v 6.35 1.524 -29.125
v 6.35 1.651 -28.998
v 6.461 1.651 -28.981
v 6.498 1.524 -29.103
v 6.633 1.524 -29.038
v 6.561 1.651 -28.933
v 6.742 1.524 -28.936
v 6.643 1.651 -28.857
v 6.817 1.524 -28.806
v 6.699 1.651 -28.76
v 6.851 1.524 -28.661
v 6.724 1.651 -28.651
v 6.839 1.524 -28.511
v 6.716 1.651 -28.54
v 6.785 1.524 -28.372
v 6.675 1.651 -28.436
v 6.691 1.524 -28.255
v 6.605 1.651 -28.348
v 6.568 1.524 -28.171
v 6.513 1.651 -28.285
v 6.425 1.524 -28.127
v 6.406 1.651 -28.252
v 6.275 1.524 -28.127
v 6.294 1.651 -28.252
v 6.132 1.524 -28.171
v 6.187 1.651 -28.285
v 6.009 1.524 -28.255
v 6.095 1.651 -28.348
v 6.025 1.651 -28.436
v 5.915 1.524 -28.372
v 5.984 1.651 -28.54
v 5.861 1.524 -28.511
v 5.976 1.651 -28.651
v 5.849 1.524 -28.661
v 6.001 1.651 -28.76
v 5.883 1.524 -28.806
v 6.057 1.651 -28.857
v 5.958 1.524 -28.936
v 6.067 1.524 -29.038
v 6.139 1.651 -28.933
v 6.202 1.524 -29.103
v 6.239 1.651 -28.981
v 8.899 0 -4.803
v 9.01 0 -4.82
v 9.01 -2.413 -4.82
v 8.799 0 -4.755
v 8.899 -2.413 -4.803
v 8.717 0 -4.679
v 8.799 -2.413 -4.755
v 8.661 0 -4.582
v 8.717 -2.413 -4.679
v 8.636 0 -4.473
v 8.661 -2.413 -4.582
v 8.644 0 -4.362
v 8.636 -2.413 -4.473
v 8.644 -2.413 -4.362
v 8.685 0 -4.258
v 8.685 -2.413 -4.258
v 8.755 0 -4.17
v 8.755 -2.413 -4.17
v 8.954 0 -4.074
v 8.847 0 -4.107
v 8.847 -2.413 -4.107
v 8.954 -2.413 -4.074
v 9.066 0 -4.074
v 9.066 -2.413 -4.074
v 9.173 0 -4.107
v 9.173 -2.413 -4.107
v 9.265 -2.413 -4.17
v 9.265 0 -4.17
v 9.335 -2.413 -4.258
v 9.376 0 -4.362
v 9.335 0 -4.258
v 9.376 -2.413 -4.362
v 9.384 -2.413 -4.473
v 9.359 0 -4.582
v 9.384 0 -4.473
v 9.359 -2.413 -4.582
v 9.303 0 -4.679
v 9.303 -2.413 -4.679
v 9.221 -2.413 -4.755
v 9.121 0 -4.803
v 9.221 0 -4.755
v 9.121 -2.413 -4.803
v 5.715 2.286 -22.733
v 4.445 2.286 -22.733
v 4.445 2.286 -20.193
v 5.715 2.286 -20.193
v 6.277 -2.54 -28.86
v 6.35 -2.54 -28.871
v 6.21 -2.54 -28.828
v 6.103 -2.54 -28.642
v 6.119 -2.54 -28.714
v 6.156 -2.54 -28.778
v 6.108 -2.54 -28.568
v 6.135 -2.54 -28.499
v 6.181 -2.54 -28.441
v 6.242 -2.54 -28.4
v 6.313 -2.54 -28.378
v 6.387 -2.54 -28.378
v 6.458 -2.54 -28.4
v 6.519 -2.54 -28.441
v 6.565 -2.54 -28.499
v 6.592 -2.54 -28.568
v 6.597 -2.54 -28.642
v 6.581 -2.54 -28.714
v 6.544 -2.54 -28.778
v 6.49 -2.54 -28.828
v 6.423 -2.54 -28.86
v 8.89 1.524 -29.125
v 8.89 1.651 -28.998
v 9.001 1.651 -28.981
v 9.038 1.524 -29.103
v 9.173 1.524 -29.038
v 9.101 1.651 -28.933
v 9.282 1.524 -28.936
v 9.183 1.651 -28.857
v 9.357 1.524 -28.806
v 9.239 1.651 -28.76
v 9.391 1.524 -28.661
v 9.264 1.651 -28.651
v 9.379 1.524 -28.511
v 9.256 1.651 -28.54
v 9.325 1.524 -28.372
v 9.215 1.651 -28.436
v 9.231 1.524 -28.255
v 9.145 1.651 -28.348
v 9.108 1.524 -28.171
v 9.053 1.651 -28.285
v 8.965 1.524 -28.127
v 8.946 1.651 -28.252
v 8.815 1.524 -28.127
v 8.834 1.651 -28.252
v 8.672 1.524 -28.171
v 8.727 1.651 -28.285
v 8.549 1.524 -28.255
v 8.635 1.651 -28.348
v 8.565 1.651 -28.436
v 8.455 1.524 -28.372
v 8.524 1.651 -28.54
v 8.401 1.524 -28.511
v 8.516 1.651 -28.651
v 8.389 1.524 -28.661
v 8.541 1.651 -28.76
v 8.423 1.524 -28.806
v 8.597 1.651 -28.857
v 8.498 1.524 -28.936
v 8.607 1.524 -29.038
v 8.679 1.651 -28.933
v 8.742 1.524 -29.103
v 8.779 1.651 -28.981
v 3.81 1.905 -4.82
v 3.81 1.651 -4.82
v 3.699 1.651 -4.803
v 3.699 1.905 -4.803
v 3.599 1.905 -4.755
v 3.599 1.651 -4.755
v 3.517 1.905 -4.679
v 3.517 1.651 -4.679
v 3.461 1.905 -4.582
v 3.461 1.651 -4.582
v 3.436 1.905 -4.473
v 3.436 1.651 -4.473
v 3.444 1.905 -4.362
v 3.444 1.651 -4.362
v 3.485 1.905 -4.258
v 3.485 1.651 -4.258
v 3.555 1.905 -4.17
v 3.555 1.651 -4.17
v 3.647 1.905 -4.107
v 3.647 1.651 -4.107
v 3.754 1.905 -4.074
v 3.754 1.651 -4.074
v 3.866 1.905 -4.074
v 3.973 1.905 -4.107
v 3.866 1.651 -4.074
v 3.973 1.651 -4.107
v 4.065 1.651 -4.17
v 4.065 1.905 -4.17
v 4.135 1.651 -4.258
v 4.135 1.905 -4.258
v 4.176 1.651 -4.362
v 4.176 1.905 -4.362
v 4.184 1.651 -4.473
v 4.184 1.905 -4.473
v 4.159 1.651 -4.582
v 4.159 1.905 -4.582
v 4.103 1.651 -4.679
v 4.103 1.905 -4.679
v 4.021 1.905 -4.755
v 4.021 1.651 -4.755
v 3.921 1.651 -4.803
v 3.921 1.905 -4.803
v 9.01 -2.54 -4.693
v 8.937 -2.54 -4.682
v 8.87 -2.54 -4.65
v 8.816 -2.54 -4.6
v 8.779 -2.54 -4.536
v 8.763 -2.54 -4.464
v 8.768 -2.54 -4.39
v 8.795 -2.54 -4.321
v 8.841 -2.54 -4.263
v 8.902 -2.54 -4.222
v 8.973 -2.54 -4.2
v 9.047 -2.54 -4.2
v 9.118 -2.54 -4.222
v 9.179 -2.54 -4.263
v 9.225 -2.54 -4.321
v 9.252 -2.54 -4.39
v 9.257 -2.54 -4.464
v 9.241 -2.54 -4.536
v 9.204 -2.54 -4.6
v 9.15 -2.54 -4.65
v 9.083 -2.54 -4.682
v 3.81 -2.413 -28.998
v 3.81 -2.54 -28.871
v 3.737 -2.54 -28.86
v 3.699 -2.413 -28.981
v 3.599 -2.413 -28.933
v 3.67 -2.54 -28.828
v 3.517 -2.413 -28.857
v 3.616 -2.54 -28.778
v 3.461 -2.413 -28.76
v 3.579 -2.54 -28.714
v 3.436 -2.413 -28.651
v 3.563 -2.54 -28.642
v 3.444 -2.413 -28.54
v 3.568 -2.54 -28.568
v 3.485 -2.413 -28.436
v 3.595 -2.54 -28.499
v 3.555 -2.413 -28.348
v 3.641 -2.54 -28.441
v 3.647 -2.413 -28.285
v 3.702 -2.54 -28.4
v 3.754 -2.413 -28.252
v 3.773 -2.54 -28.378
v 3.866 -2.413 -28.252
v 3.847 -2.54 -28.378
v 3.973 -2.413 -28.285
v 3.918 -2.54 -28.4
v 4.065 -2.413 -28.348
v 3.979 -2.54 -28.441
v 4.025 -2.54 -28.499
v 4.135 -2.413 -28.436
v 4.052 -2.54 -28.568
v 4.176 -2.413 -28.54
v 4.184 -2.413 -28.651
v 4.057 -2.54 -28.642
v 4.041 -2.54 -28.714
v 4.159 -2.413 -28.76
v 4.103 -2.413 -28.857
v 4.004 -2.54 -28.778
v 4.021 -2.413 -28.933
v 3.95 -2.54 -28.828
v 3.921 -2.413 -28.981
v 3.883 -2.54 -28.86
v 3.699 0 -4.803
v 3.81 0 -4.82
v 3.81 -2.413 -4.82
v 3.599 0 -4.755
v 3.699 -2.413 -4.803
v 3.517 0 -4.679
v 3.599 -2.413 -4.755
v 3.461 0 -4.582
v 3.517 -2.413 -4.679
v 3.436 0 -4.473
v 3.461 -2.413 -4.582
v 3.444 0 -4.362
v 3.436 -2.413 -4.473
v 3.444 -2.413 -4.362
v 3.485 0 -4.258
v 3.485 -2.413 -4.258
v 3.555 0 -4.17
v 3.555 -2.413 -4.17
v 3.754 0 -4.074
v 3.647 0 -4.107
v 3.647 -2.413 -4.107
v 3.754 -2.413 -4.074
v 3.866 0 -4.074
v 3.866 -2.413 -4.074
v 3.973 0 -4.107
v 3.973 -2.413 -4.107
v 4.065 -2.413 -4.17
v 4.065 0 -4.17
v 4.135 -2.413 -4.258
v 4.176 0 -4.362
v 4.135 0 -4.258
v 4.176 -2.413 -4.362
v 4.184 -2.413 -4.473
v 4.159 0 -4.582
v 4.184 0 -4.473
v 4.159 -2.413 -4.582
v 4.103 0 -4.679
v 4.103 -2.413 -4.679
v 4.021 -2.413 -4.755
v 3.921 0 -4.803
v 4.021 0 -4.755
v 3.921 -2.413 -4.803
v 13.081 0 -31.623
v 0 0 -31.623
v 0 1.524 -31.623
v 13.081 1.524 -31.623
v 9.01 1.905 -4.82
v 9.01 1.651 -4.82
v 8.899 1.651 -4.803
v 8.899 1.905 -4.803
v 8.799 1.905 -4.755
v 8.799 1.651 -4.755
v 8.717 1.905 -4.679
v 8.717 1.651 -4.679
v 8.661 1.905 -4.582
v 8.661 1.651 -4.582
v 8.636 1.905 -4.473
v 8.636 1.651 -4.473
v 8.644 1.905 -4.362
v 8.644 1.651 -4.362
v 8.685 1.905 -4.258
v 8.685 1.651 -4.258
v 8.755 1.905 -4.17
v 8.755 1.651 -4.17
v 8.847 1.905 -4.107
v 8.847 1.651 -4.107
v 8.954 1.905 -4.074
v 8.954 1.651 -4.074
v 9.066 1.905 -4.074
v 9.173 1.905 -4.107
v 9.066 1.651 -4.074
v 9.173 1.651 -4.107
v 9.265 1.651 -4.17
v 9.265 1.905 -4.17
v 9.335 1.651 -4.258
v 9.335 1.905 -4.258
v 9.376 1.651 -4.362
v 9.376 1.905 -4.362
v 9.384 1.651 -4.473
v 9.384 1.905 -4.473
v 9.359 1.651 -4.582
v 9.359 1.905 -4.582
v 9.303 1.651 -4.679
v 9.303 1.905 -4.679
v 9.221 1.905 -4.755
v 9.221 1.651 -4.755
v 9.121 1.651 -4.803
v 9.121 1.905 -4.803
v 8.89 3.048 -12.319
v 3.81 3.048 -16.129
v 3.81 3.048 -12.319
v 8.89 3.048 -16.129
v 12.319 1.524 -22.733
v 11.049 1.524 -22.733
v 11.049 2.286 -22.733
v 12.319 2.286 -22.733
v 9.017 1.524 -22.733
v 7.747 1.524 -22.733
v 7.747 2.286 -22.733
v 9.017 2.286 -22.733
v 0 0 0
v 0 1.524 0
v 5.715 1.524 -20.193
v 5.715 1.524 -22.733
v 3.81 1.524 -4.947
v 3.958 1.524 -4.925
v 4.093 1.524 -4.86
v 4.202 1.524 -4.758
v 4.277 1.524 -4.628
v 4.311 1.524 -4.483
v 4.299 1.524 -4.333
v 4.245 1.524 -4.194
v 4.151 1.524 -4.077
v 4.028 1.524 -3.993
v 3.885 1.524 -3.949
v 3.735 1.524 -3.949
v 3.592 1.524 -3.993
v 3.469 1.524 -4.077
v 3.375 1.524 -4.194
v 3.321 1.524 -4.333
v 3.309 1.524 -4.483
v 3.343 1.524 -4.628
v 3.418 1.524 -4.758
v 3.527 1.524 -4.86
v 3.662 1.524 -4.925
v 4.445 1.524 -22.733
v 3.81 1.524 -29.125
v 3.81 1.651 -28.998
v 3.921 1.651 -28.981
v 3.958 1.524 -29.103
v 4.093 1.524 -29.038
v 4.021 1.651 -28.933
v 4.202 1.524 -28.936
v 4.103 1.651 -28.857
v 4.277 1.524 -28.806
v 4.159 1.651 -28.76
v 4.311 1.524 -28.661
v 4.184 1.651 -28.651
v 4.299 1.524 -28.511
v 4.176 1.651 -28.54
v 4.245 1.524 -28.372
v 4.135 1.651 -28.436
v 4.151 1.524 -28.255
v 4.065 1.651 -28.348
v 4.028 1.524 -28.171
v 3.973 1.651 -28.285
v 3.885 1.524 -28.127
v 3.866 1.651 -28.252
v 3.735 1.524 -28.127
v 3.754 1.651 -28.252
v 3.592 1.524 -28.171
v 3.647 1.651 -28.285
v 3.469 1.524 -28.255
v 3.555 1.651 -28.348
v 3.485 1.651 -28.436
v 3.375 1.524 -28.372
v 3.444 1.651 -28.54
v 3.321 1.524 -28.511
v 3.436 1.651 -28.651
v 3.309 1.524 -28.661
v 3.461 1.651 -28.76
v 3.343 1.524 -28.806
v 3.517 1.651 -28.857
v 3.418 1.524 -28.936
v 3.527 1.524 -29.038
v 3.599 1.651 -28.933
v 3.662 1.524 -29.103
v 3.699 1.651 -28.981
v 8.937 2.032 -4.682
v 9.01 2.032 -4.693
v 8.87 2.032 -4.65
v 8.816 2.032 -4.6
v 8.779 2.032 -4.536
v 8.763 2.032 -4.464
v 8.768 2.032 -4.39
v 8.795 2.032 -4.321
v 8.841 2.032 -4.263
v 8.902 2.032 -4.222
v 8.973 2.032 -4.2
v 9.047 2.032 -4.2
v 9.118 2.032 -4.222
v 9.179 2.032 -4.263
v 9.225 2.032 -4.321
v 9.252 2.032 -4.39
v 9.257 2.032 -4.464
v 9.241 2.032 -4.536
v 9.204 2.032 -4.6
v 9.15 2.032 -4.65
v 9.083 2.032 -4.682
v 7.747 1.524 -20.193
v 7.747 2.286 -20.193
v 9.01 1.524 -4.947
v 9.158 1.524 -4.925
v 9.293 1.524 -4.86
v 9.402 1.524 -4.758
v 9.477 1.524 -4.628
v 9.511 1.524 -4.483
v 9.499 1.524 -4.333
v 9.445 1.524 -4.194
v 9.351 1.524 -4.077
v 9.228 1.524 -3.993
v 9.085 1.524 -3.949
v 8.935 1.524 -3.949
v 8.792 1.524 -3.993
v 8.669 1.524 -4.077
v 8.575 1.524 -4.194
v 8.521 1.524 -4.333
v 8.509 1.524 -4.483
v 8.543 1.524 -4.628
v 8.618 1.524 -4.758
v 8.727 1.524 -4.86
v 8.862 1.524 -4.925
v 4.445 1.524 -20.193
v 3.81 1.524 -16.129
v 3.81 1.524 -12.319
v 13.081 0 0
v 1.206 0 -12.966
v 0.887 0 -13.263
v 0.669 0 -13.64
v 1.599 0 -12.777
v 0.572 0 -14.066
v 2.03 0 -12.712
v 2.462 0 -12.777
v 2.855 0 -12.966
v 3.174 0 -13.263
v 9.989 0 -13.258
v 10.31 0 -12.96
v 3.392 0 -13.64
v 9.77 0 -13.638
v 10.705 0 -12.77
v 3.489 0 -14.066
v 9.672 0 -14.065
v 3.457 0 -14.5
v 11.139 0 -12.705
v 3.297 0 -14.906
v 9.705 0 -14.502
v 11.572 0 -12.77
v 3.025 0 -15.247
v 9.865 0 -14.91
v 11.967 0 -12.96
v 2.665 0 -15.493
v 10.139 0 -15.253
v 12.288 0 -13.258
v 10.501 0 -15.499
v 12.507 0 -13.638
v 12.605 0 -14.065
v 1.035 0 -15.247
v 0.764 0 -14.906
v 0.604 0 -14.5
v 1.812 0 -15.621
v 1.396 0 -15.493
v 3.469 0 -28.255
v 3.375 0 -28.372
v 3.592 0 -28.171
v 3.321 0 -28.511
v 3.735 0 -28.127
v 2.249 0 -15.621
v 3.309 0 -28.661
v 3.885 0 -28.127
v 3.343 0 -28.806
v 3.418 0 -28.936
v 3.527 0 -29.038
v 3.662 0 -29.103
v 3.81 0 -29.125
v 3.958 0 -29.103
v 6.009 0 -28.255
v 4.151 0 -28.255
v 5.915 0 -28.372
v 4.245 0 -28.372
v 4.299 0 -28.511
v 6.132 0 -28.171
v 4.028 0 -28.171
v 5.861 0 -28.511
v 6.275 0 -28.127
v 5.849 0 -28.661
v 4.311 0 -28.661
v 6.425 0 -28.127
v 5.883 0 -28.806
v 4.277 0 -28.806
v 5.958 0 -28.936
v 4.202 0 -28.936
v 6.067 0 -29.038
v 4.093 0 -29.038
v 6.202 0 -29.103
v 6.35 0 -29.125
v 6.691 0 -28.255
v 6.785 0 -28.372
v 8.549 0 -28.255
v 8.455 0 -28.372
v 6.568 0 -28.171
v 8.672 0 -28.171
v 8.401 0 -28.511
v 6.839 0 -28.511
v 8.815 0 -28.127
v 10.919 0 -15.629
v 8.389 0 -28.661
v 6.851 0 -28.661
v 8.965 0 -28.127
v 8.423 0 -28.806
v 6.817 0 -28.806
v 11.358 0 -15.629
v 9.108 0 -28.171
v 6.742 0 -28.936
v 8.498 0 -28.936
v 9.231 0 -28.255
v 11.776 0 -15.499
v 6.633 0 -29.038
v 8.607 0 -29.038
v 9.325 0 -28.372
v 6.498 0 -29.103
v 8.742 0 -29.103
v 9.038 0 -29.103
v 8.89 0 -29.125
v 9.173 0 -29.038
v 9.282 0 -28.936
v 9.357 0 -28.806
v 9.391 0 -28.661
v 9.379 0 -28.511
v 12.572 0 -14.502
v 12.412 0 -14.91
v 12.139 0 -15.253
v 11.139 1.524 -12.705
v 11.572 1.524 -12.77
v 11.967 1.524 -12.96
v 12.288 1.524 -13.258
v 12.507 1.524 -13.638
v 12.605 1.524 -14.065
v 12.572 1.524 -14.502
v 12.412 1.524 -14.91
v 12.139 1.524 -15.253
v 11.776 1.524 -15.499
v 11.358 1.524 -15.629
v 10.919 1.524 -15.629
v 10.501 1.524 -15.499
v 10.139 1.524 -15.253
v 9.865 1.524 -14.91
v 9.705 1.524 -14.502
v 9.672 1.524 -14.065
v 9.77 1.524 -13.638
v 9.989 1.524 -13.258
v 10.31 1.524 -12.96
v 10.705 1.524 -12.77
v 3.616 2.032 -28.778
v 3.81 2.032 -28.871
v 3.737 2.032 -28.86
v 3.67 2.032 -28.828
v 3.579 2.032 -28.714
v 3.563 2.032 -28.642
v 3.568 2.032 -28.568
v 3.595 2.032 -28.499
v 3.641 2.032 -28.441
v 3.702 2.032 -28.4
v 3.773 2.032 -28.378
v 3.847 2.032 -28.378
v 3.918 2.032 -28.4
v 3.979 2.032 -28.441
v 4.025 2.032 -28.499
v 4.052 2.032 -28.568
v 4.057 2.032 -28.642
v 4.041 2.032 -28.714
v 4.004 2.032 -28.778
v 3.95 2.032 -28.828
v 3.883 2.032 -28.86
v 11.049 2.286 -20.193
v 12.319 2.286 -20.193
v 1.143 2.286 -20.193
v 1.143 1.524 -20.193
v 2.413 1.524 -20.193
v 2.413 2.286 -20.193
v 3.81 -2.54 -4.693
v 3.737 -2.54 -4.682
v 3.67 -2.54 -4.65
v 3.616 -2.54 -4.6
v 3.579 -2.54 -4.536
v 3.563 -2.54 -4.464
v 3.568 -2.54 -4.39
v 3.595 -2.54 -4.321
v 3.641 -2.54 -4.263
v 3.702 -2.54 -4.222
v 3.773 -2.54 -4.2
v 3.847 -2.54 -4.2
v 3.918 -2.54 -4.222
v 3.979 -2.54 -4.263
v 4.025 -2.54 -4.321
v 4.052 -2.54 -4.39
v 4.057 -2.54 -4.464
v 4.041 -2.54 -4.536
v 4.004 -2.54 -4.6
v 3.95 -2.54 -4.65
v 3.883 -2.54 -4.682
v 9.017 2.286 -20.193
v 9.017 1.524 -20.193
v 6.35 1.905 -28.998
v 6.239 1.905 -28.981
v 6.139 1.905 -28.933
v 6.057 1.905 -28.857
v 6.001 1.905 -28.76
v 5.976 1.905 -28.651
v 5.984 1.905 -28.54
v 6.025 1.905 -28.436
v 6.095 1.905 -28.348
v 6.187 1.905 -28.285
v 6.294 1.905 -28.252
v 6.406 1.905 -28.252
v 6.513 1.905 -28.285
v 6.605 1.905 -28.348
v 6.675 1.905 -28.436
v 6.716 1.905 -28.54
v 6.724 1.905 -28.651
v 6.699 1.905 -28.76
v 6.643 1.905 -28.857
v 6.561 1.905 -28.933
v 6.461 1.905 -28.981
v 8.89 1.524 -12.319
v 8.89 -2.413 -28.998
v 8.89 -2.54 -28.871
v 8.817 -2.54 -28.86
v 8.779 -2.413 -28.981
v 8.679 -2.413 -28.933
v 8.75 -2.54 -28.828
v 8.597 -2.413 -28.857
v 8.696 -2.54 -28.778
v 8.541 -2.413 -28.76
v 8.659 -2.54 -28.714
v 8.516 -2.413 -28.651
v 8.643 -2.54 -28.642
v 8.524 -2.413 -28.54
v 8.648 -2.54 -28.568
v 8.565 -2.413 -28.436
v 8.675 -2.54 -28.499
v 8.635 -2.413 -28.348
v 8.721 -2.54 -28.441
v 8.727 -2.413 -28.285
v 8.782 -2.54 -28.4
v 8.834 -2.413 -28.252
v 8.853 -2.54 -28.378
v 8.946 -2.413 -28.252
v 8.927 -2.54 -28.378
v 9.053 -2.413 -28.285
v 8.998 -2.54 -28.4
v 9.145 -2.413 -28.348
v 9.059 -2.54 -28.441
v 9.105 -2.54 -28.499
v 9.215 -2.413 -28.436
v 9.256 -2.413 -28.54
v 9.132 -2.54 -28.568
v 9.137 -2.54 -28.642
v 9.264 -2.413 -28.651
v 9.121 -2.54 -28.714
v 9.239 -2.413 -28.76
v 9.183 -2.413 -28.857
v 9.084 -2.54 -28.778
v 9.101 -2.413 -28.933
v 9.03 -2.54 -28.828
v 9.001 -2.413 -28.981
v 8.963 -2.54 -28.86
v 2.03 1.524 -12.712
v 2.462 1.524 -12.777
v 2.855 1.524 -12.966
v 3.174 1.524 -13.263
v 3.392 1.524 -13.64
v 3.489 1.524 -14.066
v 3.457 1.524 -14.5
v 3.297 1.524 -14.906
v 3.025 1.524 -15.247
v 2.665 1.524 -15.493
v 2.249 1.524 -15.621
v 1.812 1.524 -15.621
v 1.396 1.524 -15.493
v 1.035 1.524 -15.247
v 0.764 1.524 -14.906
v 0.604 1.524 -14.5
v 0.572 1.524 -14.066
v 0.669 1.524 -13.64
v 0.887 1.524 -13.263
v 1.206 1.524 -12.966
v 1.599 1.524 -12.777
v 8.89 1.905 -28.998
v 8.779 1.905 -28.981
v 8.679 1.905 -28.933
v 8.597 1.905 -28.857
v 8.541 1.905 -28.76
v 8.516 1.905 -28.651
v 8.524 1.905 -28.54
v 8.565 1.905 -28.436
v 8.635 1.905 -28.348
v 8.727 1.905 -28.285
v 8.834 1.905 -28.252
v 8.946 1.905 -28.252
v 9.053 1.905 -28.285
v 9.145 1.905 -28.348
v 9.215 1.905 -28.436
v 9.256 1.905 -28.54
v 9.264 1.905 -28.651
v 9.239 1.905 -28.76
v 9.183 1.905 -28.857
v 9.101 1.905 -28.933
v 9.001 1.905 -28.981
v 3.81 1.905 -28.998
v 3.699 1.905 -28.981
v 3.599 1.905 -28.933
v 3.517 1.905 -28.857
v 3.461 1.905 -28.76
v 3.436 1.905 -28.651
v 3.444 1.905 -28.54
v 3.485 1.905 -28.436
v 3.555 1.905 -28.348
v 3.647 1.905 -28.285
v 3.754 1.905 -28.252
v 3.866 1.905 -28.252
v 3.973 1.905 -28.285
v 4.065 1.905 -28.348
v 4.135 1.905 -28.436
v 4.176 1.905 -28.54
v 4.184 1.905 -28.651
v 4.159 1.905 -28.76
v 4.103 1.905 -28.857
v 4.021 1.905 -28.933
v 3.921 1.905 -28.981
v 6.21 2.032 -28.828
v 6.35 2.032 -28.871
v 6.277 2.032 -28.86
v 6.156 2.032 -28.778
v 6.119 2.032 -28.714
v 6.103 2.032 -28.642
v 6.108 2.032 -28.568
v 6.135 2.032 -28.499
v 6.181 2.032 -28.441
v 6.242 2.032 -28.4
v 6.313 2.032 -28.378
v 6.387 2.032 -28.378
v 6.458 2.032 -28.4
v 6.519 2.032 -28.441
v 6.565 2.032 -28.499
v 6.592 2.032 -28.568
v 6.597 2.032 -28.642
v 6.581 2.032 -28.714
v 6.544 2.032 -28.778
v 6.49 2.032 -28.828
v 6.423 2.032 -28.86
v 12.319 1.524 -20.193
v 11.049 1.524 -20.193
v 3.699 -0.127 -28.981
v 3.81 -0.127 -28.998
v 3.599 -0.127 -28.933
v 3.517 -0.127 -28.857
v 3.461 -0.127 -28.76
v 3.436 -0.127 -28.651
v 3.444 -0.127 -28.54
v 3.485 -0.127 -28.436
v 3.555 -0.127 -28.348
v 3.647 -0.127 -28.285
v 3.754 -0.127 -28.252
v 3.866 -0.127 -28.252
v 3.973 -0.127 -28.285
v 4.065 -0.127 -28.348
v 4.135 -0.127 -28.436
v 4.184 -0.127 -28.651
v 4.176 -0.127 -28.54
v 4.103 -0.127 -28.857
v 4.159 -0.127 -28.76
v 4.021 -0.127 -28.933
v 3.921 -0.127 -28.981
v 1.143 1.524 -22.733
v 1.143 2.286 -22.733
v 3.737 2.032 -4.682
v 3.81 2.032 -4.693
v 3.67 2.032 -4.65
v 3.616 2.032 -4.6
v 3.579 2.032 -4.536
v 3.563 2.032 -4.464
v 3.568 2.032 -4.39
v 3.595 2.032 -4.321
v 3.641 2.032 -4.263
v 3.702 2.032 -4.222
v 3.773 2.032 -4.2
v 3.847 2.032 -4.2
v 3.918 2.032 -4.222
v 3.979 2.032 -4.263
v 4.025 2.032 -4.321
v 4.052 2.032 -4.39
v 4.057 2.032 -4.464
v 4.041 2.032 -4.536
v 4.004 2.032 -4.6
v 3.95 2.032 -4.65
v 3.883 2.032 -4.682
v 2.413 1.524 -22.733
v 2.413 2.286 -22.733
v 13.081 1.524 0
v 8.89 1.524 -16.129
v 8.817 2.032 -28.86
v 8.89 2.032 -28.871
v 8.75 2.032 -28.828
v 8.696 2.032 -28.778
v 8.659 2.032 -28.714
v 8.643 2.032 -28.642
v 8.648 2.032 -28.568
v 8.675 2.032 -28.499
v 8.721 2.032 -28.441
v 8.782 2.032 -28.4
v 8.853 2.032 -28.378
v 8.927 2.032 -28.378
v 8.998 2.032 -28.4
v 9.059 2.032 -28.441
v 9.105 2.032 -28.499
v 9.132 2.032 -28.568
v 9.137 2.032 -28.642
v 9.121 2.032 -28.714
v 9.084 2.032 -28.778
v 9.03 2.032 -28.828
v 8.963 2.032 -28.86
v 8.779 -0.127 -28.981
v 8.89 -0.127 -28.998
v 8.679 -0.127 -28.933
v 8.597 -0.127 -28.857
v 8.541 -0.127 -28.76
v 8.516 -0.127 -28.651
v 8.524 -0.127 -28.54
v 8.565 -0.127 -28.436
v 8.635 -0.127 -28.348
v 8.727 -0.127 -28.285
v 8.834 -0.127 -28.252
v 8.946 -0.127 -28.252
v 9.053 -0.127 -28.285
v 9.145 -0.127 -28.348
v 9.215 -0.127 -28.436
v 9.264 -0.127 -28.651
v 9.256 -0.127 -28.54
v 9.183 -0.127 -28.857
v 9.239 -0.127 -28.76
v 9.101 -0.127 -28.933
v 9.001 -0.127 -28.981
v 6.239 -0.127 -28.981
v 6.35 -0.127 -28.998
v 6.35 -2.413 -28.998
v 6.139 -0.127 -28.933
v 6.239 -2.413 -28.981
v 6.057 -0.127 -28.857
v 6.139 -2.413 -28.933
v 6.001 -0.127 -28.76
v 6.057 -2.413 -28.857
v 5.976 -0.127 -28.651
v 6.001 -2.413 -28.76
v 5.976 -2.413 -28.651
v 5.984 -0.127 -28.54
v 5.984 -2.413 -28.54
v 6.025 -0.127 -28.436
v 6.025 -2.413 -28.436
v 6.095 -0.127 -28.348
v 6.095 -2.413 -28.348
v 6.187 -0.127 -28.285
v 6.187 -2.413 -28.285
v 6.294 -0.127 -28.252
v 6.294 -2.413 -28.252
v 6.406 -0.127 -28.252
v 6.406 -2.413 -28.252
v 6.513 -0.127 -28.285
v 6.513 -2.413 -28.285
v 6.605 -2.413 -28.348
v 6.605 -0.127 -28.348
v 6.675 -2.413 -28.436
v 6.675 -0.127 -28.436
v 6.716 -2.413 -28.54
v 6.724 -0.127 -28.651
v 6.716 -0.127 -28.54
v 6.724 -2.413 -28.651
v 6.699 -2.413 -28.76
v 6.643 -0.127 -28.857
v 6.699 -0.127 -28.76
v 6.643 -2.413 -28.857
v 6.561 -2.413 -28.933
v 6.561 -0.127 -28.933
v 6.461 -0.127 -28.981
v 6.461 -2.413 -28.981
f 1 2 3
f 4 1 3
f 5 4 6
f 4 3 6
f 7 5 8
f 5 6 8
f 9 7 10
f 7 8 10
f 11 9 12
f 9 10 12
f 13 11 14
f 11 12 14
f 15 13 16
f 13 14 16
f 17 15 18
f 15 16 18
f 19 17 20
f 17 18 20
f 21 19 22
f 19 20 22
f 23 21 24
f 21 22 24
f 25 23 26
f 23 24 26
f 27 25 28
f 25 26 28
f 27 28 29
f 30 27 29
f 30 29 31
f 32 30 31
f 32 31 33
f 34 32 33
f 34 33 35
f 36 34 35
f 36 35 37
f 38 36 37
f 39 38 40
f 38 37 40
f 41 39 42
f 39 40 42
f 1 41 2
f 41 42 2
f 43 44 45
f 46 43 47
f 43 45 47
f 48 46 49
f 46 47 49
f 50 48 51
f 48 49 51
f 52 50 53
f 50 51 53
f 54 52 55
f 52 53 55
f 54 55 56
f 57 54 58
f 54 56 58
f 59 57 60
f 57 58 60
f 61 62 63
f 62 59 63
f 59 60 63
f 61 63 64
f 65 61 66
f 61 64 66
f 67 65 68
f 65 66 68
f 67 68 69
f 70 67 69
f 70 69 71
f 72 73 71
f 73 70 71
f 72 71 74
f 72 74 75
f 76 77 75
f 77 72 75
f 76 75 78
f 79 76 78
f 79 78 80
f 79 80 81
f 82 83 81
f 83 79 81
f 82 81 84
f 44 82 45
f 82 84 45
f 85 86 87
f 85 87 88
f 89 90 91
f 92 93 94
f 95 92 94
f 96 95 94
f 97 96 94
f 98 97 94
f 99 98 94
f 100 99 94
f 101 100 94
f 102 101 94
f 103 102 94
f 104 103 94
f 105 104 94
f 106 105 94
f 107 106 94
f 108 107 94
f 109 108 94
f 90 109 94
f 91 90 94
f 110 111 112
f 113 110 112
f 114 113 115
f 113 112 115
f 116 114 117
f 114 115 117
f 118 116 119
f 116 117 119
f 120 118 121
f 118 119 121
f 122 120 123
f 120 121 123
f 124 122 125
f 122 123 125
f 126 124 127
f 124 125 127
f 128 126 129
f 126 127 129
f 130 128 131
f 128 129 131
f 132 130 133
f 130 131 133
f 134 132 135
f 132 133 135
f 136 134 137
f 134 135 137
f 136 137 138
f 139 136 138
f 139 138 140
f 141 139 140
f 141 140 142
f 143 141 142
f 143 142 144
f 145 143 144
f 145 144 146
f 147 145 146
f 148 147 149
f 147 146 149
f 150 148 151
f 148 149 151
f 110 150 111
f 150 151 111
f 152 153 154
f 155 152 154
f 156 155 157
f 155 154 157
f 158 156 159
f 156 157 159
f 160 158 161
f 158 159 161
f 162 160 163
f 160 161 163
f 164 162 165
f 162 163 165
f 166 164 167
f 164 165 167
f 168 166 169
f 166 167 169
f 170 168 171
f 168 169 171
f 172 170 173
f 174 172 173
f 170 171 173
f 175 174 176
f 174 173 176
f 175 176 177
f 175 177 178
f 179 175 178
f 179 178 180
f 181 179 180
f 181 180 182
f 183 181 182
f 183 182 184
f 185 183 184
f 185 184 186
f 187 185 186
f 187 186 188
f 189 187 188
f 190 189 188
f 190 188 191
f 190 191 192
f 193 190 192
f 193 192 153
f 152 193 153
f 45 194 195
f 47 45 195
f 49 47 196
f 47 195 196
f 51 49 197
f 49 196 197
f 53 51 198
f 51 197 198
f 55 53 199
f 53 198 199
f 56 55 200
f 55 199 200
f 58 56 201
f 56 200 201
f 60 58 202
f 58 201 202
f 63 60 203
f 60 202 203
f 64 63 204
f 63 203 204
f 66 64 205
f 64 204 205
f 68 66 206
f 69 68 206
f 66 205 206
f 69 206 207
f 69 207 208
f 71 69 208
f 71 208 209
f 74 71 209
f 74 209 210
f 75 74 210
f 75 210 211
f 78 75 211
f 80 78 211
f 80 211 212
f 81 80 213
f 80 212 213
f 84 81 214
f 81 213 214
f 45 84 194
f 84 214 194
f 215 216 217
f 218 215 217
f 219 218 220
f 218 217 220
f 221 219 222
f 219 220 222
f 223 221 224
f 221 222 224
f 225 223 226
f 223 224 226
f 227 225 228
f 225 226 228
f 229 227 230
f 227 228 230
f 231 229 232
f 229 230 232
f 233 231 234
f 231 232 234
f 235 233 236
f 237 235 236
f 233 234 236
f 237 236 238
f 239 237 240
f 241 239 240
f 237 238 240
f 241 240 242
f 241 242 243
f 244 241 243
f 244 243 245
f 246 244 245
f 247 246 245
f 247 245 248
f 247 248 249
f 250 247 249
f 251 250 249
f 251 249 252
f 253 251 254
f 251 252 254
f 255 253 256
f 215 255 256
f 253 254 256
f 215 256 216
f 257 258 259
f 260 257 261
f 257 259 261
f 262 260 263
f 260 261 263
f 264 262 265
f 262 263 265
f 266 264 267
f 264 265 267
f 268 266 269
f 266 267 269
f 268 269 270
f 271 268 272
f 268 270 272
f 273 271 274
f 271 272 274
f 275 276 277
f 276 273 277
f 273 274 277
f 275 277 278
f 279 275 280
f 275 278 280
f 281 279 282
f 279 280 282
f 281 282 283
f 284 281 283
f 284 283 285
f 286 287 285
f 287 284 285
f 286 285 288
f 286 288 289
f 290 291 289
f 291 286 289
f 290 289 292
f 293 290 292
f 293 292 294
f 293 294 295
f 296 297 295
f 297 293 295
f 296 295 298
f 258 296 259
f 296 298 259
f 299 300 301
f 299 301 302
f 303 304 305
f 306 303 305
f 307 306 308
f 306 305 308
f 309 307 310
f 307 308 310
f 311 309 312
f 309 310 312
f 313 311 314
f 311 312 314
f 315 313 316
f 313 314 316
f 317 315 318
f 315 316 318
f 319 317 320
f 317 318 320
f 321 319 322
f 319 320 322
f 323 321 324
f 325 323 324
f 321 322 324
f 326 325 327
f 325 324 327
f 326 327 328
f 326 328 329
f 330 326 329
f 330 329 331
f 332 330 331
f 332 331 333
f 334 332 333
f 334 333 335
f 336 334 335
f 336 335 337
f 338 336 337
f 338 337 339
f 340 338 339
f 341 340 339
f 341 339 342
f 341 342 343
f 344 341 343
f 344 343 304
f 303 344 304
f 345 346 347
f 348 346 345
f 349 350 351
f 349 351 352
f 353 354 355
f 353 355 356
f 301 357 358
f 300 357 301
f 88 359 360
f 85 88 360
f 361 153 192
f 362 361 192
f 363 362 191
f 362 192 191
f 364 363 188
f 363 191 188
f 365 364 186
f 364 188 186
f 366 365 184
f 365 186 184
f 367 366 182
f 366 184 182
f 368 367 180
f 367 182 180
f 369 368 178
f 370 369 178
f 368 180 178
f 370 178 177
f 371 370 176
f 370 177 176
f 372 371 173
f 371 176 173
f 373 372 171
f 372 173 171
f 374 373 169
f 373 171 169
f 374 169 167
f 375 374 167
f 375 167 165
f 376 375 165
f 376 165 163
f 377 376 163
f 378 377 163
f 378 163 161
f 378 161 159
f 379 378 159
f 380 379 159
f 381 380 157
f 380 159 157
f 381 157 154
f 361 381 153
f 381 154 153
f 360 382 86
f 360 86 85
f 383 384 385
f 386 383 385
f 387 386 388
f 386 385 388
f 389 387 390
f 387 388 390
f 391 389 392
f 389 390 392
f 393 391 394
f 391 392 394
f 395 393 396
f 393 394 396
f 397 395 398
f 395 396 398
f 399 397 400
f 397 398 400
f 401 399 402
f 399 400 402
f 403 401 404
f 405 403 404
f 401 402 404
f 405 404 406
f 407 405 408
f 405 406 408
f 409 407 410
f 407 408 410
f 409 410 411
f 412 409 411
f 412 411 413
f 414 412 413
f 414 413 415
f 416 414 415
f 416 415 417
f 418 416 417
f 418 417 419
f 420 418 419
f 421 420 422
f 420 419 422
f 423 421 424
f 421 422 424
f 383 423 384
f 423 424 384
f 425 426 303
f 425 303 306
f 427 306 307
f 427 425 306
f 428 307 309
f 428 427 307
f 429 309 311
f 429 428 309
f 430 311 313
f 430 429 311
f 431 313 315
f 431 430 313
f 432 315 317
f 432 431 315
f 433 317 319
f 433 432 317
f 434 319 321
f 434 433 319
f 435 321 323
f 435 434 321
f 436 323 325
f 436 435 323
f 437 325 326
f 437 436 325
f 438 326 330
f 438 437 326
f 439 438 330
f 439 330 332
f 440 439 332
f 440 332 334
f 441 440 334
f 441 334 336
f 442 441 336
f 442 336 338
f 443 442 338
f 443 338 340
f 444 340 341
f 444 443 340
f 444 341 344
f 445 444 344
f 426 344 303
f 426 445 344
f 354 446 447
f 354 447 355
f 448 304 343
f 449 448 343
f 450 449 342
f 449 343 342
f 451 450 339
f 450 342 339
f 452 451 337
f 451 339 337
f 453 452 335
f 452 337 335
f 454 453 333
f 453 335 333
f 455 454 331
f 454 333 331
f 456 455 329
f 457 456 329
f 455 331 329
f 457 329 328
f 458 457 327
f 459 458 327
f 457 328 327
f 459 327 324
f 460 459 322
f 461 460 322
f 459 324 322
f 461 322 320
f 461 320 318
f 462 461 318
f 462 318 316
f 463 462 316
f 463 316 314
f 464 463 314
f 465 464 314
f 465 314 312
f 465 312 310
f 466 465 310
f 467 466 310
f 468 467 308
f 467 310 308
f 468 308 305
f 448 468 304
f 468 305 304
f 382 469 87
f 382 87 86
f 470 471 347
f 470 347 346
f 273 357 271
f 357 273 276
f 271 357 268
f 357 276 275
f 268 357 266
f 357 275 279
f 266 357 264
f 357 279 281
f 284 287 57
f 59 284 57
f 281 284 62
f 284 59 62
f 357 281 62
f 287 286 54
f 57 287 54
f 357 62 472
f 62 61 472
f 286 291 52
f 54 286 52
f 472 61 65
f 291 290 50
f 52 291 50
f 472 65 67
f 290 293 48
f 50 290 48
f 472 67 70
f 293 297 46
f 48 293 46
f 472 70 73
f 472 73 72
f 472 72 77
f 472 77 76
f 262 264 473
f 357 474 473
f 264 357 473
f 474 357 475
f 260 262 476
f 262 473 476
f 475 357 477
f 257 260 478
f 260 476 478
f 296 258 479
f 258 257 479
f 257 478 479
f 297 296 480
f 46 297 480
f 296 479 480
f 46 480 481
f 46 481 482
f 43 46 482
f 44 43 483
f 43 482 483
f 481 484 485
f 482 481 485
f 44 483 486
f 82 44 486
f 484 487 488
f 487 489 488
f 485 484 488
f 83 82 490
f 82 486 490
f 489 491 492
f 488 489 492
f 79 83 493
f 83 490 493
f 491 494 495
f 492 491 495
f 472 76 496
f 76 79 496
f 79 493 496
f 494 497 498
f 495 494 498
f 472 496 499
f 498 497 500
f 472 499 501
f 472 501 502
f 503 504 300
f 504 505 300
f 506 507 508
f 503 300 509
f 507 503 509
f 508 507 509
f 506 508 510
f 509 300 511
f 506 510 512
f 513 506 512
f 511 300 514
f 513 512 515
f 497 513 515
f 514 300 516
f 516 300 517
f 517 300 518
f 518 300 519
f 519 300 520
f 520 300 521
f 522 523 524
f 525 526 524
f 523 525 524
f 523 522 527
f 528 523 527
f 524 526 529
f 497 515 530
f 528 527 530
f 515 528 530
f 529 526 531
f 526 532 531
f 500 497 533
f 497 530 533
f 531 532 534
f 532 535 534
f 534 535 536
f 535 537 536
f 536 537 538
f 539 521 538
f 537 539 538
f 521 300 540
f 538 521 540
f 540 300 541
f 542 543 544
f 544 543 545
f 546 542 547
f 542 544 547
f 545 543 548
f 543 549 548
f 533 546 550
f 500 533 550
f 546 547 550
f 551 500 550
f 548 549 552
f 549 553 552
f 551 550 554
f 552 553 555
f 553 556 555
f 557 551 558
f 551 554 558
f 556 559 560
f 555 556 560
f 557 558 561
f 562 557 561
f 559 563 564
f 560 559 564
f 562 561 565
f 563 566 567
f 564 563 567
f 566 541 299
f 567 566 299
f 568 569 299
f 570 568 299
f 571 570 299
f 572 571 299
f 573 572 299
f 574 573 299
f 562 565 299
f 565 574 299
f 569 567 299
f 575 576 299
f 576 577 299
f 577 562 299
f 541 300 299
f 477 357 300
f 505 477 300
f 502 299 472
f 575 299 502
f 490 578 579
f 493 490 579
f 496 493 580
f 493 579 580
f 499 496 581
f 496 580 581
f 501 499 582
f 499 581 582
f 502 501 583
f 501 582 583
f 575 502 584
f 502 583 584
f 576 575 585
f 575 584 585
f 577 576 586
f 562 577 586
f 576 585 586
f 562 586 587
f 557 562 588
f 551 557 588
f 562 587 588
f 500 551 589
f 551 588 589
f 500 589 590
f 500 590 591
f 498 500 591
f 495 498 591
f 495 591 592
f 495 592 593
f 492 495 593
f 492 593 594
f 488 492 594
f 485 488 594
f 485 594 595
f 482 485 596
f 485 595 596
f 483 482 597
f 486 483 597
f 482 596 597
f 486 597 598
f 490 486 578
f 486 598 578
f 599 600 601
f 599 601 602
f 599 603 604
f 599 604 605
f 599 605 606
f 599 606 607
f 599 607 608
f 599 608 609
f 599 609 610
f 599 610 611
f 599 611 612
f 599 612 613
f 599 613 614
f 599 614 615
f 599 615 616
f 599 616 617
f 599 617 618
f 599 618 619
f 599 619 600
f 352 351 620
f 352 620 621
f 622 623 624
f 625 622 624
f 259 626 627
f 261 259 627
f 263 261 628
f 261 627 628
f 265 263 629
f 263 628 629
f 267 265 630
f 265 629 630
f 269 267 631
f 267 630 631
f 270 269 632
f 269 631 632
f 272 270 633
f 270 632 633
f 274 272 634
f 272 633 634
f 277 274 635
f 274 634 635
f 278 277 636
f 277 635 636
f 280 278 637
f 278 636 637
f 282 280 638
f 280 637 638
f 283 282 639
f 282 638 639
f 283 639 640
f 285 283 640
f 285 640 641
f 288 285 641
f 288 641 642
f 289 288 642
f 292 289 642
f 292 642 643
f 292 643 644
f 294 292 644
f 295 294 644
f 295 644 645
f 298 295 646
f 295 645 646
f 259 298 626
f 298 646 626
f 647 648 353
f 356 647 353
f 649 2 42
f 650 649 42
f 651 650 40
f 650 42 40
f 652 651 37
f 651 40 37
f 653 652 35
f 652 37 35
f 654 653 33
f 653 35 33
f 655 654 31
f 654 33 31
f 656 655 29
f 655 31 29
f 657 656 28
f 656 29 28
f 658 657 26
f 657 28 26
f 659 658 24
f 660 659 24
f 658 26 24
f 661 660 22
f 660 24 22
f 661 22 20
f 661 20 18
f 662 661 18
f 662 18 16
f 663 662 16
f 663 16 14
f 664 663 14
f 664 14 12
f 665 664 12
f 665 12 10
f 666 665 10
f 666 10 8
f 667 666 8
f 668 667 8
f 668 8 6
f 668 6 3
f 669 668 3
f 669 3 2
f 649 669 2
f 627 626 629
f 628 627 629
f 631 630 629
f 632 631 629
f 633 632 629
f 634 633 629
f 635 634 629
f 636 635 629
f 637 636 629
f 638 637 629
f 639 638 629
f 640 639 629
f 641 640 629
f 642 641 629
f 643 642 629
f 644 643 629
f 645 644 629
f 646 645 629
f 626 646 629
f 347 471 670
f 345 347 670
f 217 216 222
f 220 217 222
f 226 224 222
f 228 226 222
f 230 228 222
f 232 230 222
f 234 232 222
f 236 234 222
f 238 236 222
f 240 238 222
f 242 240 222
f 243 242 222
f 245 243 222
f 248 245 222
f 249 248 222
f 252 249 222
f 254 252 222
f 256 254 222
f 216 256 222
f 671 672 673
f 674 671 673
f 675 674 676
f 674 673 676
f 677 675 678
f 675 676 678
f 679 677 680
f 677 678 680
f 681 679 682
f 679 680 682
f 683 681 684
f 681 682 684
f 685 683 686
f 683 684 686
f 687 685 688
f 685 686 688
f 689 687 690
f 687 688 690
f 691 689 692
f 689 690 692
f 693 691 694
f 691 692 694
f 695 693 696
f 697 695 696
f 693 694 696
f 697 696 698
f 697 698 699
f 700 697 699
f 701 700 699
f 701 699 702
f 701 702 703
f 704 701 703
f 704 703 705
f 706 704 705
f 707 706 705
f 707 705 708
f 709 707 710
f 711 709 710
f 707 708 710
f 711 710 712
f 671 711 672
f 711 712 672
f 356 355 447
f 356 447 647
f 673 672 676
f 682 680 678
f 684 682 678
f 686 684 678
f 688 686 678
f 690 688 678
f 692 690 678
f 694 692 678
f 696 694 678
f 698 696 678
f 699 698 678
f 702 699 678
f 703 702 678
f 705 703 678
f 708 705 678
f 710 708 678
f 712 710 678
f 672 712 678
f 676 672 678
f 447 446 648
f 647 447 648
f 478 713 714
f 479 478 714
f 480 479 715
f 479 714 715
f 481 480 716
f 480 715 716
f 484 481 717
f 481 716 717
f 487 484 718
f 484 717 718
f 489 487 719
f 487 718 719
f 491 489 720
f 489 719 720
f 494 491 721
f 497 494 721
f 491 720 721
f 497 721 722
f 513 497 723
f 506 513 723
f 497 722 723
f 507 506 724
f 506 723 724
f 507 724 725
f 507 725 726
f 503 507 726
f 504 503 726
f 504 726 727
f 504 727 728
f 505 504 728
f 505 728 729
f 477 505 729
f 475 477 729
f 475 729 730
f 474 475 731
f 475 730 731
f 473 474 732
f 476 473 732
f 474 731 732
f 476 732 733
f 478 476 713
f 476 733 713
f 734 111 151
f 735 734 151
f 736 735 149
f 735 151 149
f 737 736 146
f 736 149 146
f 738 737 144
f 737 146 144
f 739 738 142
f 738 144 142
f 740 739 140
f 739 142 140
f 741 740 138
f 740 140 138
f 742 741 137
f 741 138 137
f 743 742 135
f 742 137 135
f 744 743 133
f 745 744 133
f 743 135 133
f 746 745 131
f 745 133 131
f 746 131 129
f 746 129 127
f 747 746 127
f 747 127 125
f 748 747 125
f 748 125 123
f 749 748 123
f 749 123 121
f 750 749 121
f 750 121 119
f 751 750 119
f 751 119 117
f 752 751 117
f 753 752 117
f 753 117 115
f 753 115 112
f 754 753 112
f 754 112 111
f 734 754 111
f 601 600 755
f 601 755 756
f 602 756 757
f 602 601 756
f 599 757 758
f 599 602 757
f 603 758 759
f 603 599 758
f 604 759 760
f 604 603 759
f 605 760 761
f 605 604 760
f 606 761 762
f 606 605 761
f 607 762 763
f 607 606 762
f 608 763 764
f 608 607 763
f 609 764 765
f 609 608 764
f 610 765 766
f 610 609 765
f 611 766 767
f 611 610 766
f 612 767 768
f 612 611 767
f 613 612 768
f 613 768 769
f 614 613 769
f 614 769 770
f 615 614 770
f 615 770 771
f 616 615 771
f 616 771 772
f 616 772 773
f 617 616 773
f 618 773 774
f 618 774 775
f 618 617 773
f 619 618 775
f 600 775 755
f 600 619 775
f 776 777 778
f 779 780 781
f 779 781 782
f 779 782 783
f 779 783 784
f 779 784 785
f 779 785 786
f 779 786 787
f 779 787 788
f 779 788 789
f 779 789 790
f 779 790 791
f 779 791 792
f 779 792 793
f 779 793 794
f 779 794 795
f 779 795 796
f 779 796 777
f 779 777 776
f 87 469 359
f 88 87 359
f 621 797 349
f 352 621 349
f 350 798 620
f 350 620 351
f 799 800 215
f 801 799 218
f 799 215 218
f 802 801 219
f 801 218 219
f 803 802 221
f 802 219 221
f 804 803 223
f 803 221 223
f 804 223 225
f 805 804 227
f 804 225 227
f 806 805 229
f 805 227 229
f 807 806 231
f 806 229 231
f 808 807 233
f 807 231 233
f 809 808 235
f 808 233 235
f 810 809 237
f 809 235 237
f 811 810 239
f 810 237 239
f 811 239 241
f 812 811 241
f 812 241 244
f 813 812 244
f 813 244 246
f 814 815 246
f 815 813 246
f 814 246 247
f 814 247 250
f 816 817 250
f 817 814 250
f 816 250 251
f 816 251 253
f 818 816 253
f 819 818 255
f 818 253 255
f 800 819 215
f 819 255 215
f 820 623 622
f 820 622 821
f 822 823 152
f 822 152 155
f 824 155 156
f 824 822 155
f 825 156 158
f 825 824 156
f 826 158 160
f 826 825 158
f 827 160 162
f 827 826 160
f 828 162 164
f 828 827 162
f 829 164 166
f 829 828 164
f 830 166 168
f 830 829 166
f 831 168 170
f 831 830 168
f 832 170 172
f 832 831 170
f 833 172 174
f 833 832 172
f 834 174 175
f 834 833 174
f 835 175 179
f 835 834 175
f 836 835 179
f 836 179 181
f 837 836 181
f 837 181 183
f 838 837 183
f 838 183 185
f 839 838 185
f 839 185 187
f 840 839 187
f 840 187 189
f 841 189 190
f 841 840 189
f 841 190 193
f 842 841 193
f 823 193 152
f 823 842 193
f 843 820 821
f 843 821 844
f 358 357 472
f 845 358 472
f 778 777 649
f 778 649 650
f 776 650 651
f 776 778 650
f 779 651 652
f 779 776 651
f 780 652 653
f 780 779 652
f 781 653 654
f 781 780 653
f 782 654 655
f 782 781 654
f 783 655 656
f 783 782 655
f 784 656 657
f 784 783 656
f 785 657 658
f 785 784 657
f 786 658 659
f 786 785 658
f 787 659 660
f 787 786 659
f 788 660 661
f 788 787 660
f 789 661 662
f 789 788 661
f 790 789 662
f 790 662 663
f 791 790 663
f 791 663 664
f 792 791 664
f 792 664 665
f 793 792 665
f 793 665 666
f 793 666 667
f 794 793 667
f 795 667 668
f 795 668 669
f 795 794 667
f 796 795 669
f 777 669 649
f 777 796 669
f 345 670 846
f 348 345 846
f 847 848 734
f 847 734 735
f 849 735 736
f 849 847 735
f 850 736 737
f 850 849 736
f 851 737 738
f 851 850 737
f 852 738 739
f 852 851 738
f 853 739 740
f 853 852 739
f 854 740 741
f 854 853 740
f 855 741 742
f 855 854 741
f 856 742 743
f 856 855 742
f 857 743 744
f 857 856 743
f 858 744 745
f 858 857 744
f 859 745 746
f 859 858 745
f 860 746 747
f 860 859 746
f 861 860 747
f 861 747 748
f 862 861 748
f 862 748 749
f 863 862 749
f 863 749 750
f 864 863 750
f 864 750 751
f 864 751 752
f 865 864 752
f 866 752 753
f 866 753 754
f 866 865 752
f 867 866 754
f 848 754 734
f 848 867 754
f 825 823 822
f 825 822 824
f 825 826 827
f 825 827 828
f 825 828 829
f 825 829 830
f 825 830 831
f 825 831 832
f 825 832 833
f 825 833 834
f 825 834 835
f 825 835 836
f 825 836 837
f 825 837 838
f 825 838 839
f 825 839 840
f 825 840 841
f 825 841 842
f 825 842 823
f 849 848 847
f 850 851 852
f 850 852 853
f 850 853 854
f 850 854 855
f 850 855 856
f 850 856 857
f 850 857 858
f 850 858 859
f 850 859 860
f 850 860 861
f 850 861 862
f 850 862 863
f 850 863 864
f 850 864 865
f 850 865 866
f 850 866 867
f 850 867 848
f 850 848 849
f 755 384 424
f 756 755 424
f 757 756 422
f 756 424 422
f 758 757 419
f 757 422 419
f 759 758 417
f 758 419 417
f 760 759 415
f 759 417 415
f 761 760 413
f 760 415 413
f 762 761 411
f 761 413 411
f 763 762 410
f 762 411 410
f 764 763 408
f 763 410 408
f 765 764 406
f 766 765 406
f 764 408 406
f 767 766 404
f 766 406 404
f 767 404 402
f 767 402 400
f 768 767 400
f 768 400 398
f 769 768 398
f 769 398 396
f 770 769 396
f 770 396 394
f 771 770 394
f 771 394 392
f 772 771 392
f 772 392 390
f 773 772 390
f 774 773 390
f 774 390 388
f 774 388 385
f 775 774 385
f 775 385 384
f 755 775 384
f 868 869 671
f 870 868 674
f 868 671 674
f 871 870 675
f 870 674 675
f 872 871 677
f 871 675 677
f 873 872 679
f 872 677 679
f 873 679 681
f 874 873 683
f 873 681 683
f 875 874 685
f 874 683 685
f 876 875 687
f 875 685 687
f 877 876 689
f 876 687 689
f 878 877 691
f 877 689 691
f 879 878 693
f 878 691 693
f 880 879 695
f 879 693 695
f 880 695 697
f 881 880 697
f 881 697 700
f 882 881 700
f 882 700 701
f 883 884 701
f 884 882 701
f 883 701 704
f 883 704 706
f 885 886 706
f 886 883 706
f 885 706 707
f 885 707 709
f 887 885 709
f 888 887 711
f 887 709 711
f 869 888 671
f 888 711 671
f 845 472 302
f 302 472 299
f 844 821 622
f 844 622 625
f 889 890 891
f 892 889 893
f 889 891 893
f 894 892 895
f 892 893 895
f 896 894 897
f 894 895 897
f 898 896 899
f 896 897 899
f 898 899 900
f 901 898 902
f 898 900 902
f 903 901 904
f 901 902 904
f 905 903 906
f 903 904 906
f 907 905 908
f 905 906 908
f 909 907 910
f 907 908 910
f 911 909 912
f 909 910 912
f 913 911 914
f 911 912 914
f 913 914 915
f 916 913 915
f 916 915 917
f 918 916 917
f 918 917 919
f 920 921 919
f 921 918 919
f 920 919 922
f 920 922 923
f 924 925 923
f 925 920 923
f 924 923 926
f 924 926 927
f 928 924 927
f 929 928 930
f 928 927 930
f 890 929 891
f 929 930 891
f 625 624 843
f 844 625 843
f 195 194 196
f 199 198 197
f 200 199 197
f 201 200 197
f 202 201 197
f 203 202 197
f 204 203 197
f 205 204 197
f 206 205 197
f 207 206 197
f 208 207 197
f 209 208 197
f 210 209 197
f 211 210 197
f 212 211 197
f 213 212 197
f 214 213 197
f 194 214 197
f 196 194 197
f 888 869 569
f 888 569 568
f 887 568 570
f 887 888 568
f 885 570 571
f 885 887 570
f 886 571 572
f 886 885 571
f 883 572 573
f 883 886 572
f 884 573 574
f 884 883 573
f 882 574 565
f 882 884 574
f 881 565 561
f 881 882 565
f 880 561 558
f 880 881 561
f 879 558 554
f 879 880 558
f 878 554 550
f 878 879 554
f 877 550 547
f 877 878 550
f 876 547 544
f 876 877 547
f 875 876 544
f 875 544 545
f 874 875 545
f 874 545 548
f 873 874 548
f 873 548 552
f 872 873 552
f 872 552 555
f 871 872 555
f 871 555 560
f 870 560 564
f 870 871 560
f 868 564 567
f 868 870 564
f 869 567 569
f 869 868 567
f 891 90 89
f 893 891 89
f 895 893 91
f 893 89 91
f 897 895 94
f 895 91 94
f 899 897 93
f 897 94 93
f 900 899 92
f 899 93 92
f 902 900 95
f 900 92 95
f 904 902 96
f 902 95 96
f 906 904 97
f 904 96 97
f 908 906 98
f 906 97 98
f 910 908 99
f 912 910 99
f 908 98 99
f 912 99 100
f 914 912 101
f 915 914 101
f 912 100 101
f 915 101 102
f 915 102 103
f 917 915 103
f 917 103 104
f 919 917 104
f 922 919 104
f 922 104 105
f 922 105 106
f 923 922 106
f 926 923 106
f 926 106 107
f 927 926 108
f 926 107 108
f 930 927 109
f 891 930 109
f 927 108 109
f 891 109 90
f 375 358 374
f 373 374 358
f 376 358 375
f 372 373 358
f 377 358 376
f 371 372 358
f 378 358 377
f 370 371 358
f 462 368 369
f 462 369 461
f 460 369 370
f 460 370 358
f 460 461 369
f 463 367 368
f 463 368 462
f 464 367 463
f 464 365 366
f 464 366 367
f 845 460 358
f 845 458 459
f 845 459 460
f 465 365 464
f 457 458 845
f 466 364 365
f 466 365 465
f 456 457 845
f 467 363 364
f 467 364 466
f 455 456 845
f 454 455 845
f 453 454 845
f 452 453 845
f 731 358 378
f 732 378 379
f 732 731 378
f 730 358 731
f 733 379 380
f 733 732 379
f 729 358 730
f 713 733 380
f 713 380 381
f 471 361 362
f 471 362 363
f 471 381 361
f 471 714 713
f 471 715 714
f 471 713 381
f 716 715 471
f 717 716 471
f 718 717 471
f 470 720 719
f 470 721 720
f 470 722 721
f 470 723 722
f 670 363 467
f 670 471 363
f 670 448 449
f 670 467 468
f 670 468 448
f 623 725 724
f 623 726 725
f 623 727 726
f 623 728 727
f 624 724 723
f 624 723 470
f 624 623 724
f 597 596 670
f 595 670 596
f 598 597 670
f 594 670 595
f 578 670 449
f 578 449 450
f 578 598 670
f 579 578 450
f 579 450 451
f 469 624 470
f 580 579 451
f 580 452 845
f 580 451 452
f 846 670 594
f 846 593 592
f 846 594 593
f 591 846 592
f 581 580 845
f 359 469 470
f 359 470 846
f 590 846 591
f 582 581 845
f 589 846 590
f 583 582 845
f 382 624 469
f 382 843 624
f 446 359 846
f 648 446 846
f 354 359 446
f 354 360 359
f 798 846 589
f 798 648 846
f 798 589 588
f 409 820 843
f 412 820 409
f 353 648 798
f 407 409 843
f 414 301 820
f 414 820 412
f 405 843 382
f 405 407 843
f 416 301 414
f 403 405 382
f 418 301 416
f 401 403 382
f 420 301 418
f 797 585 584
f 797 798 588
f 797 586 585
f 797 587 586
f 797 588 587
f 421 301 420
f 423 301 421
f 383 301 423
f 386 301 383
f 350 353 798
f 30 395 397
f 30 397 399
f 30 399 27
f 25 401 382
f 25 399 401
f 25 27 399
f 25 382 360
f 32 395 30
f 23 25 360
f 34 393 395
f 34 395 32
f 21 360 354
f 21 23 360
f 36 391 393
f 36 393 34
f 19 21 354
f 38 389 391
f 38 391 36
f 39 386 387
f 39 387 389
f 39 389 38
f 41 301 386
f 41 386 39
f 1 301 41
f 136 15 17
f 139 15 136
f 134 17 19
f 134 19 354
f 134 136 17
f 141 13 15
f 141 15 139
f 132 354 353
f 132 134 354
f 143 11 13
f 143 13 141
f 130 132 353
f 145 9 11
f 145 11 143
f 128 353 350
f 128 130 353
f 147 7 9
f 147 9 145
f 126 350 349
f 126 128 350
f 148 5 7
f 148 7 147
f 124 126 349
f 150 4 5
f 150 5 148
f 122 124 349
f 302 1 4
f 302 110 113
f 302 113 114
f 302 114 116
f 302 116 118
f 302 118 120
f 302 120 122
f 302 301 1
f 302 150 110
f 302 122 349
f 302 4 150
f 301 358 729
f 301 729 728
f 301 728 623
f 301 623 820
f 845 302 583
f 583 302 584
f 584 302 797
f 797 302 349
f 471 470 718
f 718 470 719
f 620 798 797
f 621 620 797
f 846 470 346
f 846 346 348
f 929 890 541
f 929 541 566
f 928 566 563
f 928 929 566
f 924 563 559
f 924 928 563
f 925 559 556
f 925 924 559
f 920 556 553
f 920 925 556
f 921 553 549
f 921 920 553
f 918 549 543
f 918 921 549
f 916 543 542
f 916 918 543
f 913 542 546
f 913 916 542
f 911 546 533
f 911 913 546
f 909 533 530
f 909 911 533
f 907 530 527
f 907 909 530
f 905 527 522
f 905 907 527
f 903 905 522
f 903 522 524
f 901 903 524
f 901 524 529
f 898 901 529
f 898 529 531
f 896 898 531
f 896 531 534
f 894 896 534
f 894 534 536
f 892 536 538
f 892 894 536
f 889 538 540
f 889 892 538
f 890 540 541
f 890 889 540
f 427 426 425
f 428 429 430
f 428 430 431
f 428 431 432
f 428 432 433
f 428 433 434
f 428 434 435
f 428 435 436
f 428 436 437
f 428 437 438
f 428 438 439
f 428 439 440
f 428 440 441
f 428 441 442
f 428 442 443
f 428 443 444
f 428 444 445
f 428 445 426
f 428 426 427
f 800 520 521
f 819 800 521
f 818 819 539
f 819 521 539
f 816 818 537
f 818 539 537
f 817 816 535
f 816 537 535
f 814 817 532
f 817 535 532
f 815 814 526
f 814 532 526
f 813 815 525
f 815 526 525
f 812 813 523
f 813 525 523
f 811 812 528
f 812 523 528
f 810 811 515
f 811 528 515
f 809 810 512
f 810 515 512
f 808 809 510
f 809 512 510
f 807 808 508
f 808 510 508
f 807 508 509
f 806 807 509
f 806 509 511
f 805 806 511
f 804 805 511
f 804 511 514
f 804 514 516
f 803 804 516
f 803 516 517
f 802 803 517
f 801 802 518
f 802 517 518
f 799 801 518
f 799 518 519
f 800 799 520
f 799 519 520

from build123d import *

# Parameters (mm, degrees)
SKETCH2_W                = 13.081
SKETCH2_H                = 31.623
BOSS_EXTRUDE1_DEPTH      = 1.524
BOSS_EXTRUDE3_DEPTH      = 0.508
BOSS_EXTRUDE3_DEPTH_BACK = 4.064
SKETCH3_R                = 0.375
CHAMFER2_SIZE            = 0.127
SKETCH4_W                = 1.27
SKETCH4_H                = 2.54
BOSS_EXTRUDE4_DEPTH      = 0.762
SKETCH5_W                = 5.08
SKETCH5_H                = 3.81
BOSS_EXTRUDE5_DEPTH      = 1.524
SKETCH6_R                = 1.462847535
SKETCH6_R_2              = 1.470158192
CUT_EXTRUDE1_DEPTH       = 1.524


with BuildPart() as part:
    # Sketch2 → Boss-Extrude1 (new body)
    with BuildSketch(Plane(origin=(0, 0, 0), x_dir=(1, 0, 0), z_dir=(0, 1, 0))):
        with Locations((6.5405, 15.8115)):
            Rectangle(SKETCH2_W, SKETCH2_H)
    extrude(amount=BOSS_EXTRUDE1_DEPTH)

    # Sketch3 → Boss-Extrude3 (add, two sides: drawn at the far end of the back side and taken through both)
    with BuildSketch(Plane(origin=(0, 1.524, 0), x_dir=(1, 0, 0), z_dir=(0, 1, 0)).offset(-BOSS_EXTRUDE3_DEPTH_BACK)):
        with Locations(Location((3.81, 28.623, 0), (0, 0, 90))):
            Circle(SKETCH3_R)
        with Locations(Location((6.35, 28.623, 0), (0, 0, 90))):
            Circle(SKETCH3_R)
        with Locations(Location((8.89, 28.623, 0), (0, 0, 90))):
            Circle(SKETCH3_R)
        with Locations(Location((3.81, 4.445, 0), (0, 0, 90))):
            Circle(SKETCH3_R)
        with Locations(Location((9.01, 4.445, 0), (0, 0, 90))):
            Circle(SKETCH3_R)
    extrude(amount=BOSS_EXTRUDE3_DEPTH + BOSS_EXTRUDE3_DEPTH_BACK)

    # Chamfer2
    chamfer2_edges = [part.edges().sort_by_distance(p)[0] for p in [
        (3.81, 1.524, -28.248),
        (3.81, 0, -28.248),
        (3.81, -2.54, -28.248),
        (3.81, 2.032, -28.248),
        (6.35, 1.524, -28.248),
        (6.35, 0, -28.248),
        (6.35, -2.54, -28.248),
        (6.35, 2.032, -28.248),
        (8.89, 1.524, -28.248),
        (8.89, 0, -28.248),
        (8.89, -2.54, -28.248),
        (8.89, 2.032, -28.248),
        (3.81, 1.524, -4.07),
        (3.81, -2.54, -4.07),
        (3.81, 2.032, -4.07),
        (9.01, 1.524, -4.07),
        (9.01, -2.54, -4.07),
        (9.01, 2.032, -4.07),
    ]]
    chamfer(chamfer2_edges, length=CHAMFER2_SIZE)

    # Sketch4 → Boss-Extrude4 (add)
    with BuildSketch(Plane(origin=(0, 1.524, 0), x_dir=(1, 0, 0), z_dir=(0, 1, 0))):
        with Locations((1.778, 21.463)):
            Rectangle(SKETCH4_W, SKETCH4_H)
        with Locations((5.08, 21.463)):
            Rectangle(SKETCH4_W, SKETCH4_H)
        with Locations((8.382, 21.463)):
            Rectangle(SKETCH4_W, SKETCH4_H)
        with Locations((11.684, 21.463)):
            Rectangle(SKETCH4_W, SKETCH4_H)
    extrude(amount=BOSS_EXTRUDE4_DEPTH)

    # Sketch5 → Boss-Extrude5 (add)
    with BuildSketch(Plane(origin=(0, 1.524, 0), x_dir=(1, 0, 0), z_dir=(0, 1, 0))):
        with Locations((6.35, 14.224)):
            Rectangle(SKETCH5_W, SKETCH5_H)
    extrude(amount=BOSS_EXTRUDE5_DEPTH)

    # Sketch6 → Cut-Extrude1 (cut)
    with BuildSketch(Plane(origin=(0, 1.524, 0), x_dir=(1, 0, 0), z_dir=(0, 1, 0))):
        with Locations(Location((2.030479475, 14.174875331, 0), (0, 0, 270))):
            Circle(SKETCH6_R)
        with Locations(Location((11.138543977, 14.174875331, 0), (0, 0, 270))):
            Circle(SKETCH6_R_2)
    extrude(amount=-CUT_EXTRUDE1_DEPTH, mode=Mode.SUBTRACT)


solid = part.part
